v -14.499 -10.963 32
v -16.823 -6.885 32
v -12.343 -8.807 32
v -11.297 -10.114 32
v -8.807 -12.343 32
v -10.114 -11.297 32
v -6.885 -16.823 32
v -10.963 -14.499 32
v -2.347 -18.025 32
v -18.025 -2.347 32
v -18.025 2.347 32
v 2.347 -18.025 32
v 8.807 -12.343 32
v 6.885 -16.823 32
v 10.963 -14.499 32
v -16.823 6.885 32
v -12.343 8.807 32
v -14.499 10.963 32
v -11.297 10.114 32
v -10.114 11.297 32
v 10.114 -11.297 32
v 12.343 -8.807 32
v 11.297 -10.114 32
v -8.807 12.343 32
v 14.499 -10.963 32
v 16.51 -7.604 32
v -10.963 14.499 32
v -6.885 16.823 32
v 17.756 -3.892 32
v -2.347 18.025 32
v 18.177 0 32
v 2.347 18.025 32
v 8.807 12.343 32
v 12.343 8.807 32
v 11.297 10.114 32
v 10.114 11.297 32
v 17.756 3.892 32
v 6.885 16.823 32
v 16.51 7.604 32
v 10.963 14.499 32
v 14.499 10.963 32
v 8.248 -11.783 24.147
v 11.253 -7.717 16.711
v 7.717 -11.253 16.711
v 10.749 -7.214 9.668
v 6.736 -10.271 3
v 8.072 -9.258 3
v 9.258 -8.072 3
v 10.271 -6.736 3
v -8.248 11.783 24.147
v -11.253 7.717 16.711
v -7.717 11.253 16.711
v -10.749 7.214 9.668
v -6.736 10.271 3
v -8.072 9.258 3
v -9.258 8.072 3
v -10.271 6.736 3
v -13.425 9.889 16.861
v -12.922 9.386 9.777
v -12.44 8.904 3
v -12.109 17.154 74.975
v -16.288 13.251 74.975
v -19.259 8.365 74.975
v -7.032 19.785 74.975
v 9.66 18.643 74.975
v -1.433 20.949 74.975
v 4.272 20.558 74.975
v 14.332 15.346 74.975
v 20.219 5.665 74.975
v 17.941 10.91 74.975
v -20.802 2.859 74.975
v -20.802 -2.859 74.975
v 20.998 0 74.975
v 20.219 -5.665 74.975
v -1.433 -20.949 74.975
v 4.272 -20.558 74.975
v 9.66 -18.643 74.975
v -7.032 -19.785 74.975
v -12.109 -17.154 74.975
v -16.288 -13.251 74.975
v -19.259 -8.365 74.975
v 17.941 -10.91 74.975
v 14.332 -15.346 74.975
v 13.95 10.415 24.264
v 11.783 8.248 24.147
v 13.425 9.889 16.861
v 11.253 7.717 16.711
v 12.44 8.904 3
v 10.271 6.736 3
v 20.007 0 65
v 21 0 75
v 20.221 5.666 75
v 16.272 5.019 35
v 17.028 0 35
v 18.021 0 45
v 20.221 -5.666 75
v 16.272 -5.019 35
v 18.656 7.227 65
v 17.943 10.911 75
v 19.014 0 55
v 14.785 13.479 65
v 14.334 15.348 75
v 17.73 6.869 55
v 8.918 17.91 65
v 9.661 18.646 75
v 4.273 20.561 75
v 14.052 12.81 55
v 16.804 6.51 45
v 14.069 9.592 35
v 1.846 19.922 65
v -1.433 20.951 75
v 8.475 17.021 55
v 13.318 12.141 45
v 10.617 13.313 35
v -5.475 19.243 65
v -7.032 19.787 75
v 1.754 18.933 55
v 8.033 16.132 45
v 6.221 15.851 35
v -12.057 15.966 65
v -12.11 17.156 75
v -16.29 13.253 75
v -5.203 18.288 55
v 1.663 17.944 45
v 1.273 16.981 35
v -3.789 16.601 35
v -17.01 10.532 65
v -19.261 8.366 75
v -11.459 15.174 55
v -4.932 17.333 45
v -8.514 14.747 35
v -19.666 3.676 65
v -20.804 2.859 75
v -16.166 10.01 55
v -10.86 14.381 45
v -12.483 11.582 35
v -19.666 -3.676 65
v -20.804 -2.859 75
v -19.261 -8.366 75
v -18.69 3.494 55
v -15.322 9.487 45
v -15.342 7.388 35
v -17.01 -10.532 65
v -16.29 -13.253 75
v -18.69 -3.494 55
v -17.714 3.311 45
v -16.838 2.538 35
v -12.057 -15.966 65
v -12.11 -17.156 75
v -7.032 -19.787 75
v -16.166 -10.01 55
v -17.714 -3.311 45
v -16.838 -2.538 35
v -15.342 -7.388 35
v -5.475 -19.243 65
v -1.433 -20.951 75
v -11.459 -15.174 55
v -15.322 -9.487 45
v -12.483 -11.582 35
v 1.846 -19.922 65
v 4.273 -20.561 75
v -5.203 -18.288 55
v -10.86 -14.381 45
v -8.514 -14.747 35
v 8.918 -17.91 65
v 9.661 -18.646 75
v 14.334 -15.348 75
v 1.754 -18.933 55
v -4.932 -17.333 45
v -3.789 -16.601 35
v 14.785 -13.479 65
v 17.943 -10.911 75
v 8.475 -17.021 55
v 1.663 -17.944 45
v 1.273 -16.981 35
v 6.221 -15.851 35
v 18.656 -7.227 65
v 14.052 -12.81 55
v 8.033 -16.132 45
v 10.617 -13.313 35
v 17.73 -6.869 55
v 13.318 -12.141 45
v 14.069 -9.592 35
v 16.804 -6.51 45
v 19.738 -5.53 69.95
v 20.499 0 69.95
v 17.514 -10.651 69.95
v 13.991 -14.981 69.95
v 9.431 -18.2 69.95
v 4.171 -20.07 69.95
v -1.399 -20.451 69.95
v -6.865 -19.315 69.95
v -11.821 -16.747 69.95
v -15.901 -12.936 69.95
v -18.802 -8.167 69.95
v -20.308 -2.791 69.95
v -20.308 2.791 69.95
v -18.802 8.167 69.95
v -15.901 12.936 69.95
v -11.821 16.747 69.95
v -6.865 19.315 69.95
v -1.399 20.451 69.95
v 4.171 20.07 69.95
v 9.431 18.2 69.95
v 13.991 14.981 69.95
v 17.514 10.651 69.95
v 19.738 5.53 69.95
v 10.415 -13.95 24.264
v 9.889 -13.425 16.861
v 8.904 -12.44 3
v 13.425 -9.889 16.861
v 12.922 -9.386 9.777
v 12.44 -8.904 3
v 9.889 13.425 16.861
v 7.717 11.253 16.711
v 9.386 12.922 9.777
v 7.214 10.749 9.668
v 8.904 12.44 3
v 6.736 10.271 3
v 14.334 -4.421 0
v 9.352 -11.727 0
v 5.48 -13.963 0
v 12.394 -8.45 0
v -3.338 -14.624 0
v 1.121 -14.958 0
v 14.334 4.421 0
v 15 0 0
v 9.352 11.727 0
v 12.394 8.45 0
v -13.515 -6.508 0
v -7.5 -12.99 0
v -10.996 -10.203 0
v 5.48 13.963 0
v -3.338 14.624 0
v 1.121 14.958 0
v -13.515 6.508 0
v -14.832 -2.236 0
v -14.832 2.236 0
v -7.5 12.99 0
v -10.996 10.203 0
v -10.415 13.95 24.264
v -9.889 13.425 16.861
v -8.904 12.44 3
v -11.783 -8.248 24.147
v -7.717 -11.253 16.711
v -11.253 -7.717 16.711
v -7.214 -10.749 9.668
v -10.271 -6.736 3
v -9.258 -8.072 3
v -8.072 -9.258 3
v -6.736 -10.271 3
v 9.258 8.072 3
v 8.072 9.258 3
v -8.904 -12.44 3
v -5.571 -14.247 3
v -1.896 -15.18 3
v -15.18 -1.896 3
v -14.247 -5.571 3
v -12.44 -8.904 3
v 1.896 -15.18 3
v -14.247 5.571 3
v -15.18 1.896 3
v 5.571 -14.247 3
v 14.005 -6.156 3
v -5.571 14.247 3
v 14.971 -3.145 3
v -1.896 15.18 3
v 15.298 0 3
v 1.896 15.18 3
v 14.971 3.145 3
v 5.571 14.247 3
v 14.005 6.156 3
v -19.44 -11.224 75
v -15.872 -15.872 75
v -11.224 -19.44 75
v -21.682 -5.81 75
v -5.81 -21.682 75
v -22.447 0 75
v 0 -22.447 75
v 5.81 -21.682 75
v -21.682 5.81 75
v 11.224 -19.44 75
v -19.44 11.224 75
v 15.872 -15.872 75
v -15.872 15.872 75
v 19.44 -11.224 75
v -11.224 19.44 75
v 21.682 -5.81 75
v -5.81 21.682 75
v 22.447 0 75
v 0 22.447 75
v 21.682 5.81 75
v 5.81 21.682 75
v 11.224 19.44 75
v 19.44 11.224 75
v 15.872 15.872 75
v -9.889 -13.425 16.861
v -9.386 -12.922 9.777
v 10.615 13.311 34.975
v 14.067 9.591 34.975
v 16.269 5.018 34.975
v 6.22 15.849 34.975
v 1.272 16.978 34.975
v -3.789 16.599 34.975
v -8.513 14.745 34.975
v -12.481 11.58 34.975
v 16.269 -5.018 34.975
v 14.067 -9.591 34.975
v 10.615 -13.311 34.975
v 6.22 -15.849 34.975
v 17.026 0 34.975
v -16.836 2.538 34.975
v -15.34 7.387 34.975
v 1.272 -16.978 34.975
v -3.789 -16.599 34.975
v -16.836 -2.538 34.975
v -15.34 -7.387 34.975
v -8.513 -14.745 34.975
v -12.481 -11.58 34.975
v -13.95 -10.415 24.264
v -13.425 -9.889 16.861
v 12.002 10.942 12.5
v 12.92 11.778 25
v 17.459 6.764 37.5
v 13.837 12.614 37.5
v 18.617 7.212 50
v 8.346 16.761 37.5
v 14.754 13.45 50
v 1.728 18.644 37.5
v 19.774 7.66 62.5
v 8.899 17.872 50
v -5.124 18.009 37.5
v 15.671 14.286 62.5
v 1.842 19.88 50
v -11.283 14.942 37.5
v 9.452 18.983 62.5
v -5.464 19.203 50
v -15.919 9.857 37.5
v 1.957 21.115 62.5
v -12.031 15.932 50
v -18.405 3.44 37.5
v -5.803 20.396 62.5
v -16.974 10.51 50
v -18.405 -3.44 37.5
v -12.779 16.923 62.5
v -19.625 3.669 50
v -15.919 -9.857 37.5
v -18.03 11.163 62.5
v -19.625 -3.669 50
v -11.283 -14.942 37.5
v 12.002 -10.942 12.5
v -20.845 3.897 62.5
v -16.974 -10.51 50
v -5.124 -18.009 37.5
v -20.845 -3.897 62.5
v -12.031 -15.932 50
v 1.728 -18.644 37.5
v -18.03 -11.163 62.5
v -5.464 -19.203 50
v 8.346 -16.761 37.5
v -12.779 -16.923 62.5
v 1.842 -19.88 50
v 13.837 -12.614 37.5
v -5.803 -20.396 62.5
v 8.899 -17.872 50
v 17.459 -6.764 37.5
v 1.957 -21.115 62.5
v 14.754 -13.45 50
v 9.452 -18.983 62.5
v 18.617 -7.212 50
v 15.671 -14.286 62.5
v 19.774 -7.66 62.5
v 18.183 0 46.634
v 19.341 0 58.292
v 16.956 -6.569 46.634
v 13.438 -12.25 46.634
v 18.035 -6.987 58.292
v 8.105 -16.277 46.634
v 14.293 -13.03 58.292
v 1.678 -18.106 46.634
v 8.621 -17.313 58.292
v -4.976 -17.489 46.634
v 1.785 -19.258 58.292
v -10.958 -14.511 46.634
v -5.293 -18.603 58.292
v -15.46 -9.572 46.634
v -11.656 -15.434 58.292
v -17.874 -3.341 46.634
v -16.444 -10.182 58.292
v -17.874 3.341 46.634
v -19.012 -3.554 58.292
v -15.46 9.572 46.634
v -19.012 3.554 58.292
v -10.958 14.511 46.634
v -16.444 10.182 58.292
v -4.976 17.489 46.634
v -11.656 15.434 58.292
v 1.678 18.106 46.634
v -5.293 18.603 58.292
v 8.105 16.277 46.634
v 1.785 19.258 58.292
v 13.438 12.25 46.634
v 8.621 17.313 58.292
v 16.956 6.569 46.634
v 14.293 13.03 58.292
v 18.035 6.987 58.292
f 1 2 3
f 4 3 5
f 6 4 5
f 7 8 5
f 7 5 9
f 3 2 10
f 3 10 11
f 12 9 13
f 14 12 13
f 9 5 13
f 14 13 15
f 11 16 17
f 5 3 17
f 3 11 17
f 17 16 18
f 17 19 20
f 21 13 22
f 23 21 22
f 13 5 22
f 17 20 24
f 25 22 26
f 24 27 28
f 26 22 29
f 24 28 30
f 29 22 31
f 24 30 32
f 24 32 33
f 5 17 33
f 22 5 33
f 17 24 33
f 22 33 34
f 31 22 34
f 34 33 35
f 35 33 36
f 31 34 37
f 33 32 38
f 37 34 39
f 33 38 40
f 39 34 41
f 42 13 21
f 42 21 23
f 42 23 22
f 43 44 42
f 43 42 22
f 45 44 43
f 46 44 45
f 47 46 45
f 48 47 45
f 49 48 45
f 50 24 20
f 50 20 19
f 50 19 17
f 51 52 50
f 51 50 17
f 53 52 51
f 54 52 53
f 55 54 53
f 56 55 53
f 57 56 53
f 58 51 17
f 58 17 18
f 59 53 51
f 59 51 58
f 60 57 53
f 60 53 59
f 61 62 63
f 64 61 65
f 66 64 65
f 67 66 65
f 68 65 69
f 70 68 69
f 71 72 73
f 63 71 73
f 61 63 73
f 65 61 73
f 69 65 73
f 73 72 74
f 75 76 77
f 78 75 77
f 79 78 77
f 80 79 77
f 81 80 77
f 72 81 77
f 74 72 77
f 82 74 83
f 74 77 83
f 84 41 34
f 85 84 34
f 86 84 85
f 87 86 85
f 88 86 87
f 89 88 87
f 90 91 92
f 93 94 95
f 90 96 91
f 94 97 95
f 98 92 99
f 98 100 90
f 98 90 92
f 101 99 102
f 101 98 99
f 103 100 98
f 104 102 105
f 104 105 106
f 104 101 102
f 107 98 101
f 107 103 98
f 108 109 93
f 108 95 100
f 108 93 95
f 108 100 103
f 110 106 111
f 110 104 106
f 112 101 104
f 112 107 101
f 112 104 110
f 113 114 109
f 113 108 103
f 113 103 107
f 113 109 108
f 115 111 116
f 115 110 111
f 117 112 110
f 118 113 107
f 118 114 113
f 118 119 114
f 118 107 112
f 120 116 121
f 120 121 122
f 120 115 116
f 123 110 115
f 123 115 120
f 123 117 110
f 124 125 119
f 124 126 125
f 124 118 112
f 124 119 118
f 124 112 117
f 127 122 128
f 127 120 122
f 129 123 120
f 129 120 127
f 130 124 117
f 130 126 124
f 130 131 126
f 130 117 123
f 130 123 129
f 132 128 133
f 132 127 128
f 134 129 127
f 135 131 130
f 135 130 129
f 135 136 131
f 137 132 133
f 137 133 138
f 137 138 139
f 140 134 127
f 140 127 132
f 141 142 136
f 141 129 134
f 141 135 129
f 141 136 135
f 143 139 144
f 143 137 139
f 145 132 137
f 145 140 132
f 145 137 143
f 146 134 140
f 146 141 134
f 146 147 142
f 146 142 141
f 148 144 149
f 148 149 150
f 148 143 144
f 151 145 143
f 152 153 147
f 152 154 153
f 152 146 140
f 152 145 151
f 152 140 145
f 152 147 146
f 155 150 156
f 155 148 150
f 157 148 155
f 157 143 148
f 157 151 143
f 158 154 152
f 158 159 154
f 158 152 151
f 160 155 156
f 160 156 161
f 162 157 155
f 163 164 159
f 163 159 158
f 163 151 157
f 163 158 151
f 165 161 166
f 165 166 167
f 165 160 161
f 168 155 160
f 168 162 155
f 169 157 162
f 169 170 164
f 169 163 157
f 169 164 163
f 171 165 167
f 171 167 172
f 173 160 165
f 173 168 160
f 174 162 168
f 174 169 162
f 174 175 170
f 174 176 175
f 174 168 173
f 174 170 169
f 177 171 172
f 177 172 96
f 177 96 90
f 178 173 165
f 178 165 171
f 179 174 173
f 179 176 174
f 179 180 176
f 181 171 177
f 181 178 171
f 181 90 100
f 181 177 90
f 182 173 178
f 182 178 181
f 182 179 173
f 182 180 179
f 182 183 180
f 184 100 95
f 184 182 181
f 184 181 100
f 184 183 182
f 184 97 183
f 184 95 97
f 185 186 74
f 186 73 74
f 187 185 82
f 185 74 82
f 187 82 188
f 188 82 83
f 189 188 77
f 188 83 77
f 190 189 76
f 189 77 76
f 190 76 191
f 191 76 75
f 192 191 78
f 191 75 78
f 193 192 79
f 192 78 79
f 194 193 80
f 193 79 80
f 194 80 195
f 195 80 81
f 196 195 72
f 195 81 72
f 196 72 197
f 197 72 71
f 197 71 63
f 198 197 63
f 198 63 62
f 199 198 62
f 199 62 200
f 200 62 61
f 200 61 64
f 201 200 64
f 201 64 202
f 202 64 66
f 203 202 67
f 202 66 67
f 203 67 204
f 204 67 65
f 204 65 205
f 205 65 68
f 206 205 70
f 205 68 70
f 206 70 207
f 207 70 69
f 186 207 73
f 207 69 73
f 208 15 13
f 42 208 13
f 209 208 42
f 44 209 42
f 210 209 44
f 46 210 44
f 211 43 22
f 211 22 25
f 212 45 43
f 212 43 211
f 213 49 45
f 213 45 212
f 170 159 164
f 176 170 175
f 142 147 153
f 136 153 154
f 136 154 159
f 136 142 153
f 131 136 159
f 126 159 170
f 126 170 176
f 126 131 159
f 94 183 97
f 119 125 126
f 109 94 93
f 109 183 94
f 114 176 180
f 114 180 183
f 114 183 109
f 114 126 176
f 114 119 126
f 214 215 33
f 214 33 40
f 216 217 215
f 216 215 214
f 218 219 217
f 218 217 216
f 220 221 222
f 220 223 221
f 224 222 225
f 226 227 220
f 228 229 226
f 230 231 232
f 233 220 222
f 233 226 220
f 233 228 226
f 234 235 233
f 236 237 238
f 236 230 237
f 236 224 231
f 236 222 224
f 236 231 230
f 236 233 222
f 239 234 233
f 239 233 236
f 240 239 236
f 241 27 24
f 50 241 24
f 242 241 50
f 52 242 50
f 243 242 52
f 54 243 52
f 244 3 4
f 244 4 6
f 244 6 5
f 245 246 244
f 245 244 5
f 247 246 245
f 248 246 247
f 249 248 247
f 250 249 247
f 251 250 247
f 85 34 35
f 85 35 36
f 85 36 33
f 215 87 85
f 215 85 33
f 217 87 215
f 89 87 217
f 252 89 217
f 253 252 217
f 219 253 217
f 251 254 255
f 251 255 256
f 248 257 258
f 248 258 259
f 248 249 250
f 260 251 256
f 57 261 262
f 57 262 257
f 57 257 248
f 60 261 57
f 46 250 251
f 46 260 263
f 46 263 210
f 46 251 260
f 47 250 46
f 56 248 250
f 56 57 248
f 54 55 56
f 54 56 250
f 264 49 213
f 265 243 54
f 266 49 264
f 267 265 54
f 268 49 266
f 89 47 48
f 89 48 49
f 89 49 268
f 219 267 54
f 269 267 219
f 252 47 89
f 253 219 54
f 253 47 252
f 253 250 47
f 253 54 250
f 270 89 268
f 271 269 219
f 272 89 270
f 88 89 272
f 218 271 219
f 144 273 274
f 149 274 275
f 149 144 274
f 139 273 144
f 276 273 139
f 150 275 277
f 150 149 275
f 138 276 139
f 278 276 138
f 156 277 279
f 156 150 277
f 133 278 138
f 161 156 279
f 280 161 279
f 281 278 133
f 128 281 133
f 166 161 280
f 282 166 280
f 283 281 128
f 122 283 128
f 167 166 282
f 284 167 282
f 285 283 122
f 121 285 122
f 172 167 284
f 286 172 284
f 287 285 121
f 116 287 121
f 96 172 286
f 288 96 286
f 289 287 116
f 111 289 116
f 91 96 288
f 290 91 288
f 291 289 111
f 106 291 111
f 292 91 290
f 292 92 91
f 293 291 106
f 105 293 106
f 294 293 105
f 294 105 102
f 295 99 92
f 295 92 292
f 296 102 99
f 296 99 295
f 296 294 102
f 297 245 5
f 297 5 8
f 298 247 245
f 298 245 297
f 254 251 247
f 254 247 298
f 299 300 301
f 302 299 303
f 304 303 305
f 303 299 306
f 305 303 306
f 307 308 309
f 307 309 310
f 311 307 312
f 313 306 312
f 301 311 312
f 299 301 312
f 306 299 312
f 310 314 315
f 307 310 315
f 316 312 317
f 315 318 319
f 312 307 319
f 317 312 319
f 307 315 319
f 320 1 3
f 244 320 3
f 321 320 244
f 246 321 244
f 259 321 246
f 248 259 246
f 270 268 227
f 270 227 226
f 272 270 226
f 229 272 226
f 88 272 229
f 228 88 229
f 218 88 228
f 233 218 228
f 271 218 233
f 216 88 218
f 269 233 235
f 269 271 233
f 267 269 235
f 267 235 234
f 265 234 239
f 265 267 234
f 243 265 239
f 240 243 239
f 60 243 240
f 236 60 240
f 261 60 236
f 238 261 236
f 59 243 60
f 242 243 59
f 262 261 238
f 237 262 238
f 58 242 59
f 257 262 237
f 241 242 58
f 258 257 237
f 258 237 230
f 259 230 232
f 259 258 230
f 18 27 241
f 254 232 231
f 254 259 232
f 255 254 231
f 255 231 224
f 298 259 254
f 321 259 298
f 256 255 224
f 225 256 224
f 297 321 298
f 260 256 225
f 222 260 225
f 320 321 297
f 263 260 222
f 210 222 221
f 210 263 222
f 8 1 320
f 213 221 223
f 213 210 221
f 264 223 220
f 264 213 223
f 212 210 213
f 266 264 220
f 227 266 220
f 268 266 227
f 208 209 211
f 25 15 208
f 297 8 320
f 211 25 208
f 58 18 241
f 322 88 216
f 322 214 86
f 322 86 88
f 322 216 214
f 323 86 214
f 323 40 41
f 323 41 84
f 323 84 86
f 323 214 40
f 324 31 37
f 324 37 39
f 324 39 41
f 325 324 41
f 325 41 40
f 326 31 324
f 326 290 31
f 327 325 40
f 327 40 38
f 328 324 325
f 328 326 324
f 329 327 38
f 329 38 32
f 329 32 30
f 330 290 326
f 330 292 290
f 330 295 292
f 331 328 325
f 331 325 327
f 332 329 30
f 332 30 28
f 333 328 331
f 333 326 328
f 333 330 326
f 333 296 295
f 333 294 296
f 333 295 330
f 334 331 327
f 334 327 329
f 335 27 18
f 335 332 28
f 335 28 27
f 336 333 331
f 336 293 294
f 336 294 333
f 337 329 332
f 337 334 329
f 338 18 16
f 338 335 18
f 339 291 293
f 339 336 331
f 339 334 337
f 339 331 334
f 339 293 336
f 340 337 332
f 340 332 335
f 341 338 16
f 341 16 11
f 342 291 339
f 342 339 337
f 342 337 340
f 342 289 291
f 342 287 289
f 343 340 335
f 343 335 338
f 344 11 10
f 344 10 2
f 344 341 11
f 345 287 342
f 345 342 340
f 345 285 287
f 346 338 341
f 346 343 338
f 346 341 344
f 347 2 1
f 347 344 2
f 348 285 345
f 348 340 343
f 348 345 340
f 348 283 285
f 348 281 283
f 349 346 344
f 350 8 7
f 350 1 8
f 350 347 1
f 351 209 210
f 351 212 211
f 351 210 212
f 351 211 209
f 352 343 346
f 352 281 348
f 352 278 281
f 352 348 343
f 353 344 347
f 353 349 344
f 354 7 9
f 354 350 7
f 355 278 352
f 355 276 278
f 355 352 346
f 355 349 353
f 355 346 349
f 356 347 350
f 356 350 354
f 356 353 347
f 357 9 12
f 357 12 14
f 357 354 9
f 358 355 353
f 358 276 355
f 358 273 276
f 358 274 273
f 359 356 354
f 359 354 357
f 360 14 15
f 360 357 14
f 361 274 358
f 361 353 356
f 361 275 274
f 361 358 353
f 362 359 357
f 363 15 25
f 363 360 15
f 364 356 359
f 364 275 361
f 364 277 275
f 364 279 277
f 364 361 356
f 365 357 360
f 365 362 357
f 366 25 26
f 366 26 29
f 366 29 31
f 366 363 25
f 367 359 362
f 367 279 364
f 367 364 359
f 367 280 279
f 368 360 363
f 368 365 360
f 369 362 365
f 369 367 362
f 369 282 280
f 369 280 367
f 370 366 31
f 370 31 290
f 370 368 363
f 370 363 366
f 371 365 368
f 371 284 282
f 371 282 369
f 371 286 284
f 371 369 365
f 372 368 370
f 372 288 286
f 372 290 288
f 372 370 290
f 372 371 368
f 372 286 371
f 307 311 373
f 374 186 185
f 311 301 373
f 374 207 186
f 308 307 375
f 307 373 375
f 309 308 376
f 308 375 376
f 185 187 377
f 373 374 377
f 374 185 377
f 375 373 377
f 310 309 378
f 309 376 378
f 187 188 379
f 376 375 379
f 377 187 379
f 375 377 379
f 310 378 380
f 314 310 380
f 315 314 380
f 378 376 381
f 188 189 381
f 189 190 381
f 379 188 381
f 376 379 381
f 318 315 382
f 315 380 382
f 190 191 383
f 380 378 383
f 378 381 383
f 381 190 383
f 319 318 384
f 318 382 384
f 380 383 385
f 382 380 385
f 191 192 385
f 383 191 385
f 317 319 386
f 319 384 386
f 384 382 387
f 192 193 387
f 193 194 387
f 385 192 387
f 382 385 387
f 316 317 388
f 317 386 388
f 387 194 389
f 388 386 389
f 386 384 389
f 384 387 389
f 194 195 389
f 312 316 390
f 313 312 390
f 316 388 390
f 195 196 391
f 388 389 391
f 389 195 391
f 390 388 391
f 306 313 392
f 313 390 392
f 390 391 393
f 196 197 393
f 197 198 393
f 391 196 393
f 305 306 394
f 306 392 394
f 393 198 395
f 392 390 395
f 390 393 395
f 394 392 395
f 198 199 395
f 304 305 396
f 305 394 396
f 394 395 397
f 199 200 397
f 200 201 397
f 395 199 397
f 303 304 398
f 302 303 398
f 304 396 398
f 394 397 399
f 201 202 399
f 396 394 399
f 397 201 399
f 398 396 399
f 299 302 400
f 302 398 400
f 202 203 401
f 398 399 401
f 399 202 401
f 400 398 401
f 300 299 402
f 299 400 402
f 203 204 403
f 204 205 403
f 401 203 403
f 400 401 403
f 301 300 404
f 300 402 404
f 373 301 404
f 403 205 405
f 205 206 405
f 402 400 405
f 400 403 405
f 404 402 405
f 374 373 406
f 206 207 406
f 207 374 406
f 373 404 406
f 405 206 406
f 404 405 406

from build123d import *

# Parameters (mm, degrees)
F3_DEPTH = 29
F6_DEPTH = 2


with BuildPart() as f1:
    # F0 (on Front) → F1 (revolve)
    with BuildSketch(Plane.XZ):
        Polygon((0, 3), (0, 0), (15, 0), (22.447081343, 75), (21, 75), (17.0282232837, 35), (0, 35), (0, 32), (15.1626685751, 32), (12.2831304558, 3), align=None)
    revolve(axis=Axis((0, 0, 33.5), (0, 0, 1)))

    # F2 (on face) → F3 (cut)
    with BuildSketch(Plane.XY.offset(3)):
        with BuildLine():
            Line((12.2634482474, 15.7989821534), (15.6845353346, 19.2200692405))
            ThreePointArc((15.6845353346, 19.2200692405), (0, 24.8075736474), (-15.6845353346, 19.2200692405))
            Line((-15.6845353346, 19.2200692405), (-12.2634482474, 15.7989821534))
            Line((-12.2634482474, 15.7989821534), (-5.0787650158, 8.6142989218))
            ThreePointArc((-5.0787650158, 8.6142989218), (0, 10), (5.0787650158, 8.6142989218))
            Line((5.0787650158, 8.6142989218), (12.2634482474, 15.7989821534))
        make_face()
        with BuildLine():
            Line((19.2200692405, 15.6845353346), (15.7989821534, 12.2634482474))
            Line((15.7989821534, 12.2634482474), (8.6142989218, 5.0787650158))
            ThreePointArc((8.6142989218, 5.0787650158), (10, 0), (8.6142989218, -5.0787650158))
            Line((8.6142989218, -5.0787650158), (15.7989821534, -12.2634482474))
            Line((15.7989821534, -12.2634482474), (19.2200692405, -15.6845353346))
            ThreePointArc((19.2200692405, -15.6845353346), (24.8075736474, 0), (19.2200692405, 15.6845353346))
        make_face()
        with BuildLine():
            Line((-8.6142989218, 5.0787650158), (-15.7989821534, 12.2634482474))
            Line((-15.7989821534, 12.2634482474), (-19.2200692405, 15.6845353346))
            ThreePointArc((-19.2200692405, 15.6845353346), (-24.8075736474, 0), (-19.2200692405, -15.6845353346))
            Line((-19.2200692405, -15.6845353346), (-15.7989821534, -12.2634482474))
            Line((-15.7989821534, -12.2634482474), (-8.6142989218, -5.0787650158))
            ThreePointArc((-8.6142989218, -5.0787650158), (-10, 0), (-8.6142989218, 5.0787650158))
        make_face()
        with BuildLine():
            Line((15.6845353346, -19.2200692405), (12.2634482474, -15.7989821534))
            Line((12.2634482474, -15.7989821534), (5.0787650158, -8.6142989218))
            ThreePointArc((5.0787650158, -8.6142989218), (0, -10), (-5.0787650158, -8.6142989218))
            Line((-5.0787650158, -8.6142989218), (-12.2634482474, -15.7989821534))
            Line((-12.2634482474, -15.7989821534), (-15.6845353346, -19.2200692405))
            ThreePointArc((-15.6845353346, -19.2200692405), (0, -24.8075736474), (15.6845353346, -19.2200692405))
        make_face()
    extrude(amount=F3_DEPTH, mode=Mode.SUBTRACT)


with BuildPart() as f6:
    # F5 (on Front) → F6 (new body, symmetric)
    with BuildSketch(Plane.XZ):
        with BuildLine():
            Line((3, 33.25), (0, 33.25))
            Line((0, 33.25), (-3, 33.25))
            Line((-3, 33.25), (-3, 29.1189500386))
            ThreePointArc((-3, 29.1189500386), (-12, 17.5), (-3, 5.8810499614))
            Line((-3, 5.8810499614), (-3, 1.75))
            Line((-3, 1.75), (0, 1.75))
            Line((0, 1.75), (3, 1.75))
            Line((3, 1.75), (3, 5.8810499614))
            ThreePointArc((3, 5.8810499614), (12, 17.5), (3, 29.1189500386))
            Line((3, 29.1189500386), (3, 33.25))
        make_face()
    extrude(amount=F6_DEPTH, both=True)

    # F7 (on Front) → F8 (revolve, cut)
    with BuildSketch(Plane.XZ):
        Polygon((0, 33.25), (3, 33.25), (3, 29.1189500386), (5, 29.1189500386), (5, 34.3002825975), (0, 34.3002825975), align=None)
        Polygon((5, 0.6997174025), (5, 5.8810499614), (3, 5.8810499614), (3, 1.75), (0, 1.75), (0, 0.6997174025), align=None)
    revolve(axis=Axis((0, 0, 33.7751412988), (0, 0, 1)), mode=Mode.SUBTRACT)


with BuildPart() as f10:
    # F9 (on Front) → F10 (revolve)
    with BuildSketch(Plane.XZ):
        Polygon((20.4986119055, 69.9504906211), (20.9975468235, 74.9752939134), (0, 74.9752939134), (0, 34.9752939134), (17.0257701072, 34.9752939134), align=None)
    revolve(axis=Axis((0, 0, 54.9752939134), (0, 0, -1)))


solid = Compound([f1.part, f10.part])
